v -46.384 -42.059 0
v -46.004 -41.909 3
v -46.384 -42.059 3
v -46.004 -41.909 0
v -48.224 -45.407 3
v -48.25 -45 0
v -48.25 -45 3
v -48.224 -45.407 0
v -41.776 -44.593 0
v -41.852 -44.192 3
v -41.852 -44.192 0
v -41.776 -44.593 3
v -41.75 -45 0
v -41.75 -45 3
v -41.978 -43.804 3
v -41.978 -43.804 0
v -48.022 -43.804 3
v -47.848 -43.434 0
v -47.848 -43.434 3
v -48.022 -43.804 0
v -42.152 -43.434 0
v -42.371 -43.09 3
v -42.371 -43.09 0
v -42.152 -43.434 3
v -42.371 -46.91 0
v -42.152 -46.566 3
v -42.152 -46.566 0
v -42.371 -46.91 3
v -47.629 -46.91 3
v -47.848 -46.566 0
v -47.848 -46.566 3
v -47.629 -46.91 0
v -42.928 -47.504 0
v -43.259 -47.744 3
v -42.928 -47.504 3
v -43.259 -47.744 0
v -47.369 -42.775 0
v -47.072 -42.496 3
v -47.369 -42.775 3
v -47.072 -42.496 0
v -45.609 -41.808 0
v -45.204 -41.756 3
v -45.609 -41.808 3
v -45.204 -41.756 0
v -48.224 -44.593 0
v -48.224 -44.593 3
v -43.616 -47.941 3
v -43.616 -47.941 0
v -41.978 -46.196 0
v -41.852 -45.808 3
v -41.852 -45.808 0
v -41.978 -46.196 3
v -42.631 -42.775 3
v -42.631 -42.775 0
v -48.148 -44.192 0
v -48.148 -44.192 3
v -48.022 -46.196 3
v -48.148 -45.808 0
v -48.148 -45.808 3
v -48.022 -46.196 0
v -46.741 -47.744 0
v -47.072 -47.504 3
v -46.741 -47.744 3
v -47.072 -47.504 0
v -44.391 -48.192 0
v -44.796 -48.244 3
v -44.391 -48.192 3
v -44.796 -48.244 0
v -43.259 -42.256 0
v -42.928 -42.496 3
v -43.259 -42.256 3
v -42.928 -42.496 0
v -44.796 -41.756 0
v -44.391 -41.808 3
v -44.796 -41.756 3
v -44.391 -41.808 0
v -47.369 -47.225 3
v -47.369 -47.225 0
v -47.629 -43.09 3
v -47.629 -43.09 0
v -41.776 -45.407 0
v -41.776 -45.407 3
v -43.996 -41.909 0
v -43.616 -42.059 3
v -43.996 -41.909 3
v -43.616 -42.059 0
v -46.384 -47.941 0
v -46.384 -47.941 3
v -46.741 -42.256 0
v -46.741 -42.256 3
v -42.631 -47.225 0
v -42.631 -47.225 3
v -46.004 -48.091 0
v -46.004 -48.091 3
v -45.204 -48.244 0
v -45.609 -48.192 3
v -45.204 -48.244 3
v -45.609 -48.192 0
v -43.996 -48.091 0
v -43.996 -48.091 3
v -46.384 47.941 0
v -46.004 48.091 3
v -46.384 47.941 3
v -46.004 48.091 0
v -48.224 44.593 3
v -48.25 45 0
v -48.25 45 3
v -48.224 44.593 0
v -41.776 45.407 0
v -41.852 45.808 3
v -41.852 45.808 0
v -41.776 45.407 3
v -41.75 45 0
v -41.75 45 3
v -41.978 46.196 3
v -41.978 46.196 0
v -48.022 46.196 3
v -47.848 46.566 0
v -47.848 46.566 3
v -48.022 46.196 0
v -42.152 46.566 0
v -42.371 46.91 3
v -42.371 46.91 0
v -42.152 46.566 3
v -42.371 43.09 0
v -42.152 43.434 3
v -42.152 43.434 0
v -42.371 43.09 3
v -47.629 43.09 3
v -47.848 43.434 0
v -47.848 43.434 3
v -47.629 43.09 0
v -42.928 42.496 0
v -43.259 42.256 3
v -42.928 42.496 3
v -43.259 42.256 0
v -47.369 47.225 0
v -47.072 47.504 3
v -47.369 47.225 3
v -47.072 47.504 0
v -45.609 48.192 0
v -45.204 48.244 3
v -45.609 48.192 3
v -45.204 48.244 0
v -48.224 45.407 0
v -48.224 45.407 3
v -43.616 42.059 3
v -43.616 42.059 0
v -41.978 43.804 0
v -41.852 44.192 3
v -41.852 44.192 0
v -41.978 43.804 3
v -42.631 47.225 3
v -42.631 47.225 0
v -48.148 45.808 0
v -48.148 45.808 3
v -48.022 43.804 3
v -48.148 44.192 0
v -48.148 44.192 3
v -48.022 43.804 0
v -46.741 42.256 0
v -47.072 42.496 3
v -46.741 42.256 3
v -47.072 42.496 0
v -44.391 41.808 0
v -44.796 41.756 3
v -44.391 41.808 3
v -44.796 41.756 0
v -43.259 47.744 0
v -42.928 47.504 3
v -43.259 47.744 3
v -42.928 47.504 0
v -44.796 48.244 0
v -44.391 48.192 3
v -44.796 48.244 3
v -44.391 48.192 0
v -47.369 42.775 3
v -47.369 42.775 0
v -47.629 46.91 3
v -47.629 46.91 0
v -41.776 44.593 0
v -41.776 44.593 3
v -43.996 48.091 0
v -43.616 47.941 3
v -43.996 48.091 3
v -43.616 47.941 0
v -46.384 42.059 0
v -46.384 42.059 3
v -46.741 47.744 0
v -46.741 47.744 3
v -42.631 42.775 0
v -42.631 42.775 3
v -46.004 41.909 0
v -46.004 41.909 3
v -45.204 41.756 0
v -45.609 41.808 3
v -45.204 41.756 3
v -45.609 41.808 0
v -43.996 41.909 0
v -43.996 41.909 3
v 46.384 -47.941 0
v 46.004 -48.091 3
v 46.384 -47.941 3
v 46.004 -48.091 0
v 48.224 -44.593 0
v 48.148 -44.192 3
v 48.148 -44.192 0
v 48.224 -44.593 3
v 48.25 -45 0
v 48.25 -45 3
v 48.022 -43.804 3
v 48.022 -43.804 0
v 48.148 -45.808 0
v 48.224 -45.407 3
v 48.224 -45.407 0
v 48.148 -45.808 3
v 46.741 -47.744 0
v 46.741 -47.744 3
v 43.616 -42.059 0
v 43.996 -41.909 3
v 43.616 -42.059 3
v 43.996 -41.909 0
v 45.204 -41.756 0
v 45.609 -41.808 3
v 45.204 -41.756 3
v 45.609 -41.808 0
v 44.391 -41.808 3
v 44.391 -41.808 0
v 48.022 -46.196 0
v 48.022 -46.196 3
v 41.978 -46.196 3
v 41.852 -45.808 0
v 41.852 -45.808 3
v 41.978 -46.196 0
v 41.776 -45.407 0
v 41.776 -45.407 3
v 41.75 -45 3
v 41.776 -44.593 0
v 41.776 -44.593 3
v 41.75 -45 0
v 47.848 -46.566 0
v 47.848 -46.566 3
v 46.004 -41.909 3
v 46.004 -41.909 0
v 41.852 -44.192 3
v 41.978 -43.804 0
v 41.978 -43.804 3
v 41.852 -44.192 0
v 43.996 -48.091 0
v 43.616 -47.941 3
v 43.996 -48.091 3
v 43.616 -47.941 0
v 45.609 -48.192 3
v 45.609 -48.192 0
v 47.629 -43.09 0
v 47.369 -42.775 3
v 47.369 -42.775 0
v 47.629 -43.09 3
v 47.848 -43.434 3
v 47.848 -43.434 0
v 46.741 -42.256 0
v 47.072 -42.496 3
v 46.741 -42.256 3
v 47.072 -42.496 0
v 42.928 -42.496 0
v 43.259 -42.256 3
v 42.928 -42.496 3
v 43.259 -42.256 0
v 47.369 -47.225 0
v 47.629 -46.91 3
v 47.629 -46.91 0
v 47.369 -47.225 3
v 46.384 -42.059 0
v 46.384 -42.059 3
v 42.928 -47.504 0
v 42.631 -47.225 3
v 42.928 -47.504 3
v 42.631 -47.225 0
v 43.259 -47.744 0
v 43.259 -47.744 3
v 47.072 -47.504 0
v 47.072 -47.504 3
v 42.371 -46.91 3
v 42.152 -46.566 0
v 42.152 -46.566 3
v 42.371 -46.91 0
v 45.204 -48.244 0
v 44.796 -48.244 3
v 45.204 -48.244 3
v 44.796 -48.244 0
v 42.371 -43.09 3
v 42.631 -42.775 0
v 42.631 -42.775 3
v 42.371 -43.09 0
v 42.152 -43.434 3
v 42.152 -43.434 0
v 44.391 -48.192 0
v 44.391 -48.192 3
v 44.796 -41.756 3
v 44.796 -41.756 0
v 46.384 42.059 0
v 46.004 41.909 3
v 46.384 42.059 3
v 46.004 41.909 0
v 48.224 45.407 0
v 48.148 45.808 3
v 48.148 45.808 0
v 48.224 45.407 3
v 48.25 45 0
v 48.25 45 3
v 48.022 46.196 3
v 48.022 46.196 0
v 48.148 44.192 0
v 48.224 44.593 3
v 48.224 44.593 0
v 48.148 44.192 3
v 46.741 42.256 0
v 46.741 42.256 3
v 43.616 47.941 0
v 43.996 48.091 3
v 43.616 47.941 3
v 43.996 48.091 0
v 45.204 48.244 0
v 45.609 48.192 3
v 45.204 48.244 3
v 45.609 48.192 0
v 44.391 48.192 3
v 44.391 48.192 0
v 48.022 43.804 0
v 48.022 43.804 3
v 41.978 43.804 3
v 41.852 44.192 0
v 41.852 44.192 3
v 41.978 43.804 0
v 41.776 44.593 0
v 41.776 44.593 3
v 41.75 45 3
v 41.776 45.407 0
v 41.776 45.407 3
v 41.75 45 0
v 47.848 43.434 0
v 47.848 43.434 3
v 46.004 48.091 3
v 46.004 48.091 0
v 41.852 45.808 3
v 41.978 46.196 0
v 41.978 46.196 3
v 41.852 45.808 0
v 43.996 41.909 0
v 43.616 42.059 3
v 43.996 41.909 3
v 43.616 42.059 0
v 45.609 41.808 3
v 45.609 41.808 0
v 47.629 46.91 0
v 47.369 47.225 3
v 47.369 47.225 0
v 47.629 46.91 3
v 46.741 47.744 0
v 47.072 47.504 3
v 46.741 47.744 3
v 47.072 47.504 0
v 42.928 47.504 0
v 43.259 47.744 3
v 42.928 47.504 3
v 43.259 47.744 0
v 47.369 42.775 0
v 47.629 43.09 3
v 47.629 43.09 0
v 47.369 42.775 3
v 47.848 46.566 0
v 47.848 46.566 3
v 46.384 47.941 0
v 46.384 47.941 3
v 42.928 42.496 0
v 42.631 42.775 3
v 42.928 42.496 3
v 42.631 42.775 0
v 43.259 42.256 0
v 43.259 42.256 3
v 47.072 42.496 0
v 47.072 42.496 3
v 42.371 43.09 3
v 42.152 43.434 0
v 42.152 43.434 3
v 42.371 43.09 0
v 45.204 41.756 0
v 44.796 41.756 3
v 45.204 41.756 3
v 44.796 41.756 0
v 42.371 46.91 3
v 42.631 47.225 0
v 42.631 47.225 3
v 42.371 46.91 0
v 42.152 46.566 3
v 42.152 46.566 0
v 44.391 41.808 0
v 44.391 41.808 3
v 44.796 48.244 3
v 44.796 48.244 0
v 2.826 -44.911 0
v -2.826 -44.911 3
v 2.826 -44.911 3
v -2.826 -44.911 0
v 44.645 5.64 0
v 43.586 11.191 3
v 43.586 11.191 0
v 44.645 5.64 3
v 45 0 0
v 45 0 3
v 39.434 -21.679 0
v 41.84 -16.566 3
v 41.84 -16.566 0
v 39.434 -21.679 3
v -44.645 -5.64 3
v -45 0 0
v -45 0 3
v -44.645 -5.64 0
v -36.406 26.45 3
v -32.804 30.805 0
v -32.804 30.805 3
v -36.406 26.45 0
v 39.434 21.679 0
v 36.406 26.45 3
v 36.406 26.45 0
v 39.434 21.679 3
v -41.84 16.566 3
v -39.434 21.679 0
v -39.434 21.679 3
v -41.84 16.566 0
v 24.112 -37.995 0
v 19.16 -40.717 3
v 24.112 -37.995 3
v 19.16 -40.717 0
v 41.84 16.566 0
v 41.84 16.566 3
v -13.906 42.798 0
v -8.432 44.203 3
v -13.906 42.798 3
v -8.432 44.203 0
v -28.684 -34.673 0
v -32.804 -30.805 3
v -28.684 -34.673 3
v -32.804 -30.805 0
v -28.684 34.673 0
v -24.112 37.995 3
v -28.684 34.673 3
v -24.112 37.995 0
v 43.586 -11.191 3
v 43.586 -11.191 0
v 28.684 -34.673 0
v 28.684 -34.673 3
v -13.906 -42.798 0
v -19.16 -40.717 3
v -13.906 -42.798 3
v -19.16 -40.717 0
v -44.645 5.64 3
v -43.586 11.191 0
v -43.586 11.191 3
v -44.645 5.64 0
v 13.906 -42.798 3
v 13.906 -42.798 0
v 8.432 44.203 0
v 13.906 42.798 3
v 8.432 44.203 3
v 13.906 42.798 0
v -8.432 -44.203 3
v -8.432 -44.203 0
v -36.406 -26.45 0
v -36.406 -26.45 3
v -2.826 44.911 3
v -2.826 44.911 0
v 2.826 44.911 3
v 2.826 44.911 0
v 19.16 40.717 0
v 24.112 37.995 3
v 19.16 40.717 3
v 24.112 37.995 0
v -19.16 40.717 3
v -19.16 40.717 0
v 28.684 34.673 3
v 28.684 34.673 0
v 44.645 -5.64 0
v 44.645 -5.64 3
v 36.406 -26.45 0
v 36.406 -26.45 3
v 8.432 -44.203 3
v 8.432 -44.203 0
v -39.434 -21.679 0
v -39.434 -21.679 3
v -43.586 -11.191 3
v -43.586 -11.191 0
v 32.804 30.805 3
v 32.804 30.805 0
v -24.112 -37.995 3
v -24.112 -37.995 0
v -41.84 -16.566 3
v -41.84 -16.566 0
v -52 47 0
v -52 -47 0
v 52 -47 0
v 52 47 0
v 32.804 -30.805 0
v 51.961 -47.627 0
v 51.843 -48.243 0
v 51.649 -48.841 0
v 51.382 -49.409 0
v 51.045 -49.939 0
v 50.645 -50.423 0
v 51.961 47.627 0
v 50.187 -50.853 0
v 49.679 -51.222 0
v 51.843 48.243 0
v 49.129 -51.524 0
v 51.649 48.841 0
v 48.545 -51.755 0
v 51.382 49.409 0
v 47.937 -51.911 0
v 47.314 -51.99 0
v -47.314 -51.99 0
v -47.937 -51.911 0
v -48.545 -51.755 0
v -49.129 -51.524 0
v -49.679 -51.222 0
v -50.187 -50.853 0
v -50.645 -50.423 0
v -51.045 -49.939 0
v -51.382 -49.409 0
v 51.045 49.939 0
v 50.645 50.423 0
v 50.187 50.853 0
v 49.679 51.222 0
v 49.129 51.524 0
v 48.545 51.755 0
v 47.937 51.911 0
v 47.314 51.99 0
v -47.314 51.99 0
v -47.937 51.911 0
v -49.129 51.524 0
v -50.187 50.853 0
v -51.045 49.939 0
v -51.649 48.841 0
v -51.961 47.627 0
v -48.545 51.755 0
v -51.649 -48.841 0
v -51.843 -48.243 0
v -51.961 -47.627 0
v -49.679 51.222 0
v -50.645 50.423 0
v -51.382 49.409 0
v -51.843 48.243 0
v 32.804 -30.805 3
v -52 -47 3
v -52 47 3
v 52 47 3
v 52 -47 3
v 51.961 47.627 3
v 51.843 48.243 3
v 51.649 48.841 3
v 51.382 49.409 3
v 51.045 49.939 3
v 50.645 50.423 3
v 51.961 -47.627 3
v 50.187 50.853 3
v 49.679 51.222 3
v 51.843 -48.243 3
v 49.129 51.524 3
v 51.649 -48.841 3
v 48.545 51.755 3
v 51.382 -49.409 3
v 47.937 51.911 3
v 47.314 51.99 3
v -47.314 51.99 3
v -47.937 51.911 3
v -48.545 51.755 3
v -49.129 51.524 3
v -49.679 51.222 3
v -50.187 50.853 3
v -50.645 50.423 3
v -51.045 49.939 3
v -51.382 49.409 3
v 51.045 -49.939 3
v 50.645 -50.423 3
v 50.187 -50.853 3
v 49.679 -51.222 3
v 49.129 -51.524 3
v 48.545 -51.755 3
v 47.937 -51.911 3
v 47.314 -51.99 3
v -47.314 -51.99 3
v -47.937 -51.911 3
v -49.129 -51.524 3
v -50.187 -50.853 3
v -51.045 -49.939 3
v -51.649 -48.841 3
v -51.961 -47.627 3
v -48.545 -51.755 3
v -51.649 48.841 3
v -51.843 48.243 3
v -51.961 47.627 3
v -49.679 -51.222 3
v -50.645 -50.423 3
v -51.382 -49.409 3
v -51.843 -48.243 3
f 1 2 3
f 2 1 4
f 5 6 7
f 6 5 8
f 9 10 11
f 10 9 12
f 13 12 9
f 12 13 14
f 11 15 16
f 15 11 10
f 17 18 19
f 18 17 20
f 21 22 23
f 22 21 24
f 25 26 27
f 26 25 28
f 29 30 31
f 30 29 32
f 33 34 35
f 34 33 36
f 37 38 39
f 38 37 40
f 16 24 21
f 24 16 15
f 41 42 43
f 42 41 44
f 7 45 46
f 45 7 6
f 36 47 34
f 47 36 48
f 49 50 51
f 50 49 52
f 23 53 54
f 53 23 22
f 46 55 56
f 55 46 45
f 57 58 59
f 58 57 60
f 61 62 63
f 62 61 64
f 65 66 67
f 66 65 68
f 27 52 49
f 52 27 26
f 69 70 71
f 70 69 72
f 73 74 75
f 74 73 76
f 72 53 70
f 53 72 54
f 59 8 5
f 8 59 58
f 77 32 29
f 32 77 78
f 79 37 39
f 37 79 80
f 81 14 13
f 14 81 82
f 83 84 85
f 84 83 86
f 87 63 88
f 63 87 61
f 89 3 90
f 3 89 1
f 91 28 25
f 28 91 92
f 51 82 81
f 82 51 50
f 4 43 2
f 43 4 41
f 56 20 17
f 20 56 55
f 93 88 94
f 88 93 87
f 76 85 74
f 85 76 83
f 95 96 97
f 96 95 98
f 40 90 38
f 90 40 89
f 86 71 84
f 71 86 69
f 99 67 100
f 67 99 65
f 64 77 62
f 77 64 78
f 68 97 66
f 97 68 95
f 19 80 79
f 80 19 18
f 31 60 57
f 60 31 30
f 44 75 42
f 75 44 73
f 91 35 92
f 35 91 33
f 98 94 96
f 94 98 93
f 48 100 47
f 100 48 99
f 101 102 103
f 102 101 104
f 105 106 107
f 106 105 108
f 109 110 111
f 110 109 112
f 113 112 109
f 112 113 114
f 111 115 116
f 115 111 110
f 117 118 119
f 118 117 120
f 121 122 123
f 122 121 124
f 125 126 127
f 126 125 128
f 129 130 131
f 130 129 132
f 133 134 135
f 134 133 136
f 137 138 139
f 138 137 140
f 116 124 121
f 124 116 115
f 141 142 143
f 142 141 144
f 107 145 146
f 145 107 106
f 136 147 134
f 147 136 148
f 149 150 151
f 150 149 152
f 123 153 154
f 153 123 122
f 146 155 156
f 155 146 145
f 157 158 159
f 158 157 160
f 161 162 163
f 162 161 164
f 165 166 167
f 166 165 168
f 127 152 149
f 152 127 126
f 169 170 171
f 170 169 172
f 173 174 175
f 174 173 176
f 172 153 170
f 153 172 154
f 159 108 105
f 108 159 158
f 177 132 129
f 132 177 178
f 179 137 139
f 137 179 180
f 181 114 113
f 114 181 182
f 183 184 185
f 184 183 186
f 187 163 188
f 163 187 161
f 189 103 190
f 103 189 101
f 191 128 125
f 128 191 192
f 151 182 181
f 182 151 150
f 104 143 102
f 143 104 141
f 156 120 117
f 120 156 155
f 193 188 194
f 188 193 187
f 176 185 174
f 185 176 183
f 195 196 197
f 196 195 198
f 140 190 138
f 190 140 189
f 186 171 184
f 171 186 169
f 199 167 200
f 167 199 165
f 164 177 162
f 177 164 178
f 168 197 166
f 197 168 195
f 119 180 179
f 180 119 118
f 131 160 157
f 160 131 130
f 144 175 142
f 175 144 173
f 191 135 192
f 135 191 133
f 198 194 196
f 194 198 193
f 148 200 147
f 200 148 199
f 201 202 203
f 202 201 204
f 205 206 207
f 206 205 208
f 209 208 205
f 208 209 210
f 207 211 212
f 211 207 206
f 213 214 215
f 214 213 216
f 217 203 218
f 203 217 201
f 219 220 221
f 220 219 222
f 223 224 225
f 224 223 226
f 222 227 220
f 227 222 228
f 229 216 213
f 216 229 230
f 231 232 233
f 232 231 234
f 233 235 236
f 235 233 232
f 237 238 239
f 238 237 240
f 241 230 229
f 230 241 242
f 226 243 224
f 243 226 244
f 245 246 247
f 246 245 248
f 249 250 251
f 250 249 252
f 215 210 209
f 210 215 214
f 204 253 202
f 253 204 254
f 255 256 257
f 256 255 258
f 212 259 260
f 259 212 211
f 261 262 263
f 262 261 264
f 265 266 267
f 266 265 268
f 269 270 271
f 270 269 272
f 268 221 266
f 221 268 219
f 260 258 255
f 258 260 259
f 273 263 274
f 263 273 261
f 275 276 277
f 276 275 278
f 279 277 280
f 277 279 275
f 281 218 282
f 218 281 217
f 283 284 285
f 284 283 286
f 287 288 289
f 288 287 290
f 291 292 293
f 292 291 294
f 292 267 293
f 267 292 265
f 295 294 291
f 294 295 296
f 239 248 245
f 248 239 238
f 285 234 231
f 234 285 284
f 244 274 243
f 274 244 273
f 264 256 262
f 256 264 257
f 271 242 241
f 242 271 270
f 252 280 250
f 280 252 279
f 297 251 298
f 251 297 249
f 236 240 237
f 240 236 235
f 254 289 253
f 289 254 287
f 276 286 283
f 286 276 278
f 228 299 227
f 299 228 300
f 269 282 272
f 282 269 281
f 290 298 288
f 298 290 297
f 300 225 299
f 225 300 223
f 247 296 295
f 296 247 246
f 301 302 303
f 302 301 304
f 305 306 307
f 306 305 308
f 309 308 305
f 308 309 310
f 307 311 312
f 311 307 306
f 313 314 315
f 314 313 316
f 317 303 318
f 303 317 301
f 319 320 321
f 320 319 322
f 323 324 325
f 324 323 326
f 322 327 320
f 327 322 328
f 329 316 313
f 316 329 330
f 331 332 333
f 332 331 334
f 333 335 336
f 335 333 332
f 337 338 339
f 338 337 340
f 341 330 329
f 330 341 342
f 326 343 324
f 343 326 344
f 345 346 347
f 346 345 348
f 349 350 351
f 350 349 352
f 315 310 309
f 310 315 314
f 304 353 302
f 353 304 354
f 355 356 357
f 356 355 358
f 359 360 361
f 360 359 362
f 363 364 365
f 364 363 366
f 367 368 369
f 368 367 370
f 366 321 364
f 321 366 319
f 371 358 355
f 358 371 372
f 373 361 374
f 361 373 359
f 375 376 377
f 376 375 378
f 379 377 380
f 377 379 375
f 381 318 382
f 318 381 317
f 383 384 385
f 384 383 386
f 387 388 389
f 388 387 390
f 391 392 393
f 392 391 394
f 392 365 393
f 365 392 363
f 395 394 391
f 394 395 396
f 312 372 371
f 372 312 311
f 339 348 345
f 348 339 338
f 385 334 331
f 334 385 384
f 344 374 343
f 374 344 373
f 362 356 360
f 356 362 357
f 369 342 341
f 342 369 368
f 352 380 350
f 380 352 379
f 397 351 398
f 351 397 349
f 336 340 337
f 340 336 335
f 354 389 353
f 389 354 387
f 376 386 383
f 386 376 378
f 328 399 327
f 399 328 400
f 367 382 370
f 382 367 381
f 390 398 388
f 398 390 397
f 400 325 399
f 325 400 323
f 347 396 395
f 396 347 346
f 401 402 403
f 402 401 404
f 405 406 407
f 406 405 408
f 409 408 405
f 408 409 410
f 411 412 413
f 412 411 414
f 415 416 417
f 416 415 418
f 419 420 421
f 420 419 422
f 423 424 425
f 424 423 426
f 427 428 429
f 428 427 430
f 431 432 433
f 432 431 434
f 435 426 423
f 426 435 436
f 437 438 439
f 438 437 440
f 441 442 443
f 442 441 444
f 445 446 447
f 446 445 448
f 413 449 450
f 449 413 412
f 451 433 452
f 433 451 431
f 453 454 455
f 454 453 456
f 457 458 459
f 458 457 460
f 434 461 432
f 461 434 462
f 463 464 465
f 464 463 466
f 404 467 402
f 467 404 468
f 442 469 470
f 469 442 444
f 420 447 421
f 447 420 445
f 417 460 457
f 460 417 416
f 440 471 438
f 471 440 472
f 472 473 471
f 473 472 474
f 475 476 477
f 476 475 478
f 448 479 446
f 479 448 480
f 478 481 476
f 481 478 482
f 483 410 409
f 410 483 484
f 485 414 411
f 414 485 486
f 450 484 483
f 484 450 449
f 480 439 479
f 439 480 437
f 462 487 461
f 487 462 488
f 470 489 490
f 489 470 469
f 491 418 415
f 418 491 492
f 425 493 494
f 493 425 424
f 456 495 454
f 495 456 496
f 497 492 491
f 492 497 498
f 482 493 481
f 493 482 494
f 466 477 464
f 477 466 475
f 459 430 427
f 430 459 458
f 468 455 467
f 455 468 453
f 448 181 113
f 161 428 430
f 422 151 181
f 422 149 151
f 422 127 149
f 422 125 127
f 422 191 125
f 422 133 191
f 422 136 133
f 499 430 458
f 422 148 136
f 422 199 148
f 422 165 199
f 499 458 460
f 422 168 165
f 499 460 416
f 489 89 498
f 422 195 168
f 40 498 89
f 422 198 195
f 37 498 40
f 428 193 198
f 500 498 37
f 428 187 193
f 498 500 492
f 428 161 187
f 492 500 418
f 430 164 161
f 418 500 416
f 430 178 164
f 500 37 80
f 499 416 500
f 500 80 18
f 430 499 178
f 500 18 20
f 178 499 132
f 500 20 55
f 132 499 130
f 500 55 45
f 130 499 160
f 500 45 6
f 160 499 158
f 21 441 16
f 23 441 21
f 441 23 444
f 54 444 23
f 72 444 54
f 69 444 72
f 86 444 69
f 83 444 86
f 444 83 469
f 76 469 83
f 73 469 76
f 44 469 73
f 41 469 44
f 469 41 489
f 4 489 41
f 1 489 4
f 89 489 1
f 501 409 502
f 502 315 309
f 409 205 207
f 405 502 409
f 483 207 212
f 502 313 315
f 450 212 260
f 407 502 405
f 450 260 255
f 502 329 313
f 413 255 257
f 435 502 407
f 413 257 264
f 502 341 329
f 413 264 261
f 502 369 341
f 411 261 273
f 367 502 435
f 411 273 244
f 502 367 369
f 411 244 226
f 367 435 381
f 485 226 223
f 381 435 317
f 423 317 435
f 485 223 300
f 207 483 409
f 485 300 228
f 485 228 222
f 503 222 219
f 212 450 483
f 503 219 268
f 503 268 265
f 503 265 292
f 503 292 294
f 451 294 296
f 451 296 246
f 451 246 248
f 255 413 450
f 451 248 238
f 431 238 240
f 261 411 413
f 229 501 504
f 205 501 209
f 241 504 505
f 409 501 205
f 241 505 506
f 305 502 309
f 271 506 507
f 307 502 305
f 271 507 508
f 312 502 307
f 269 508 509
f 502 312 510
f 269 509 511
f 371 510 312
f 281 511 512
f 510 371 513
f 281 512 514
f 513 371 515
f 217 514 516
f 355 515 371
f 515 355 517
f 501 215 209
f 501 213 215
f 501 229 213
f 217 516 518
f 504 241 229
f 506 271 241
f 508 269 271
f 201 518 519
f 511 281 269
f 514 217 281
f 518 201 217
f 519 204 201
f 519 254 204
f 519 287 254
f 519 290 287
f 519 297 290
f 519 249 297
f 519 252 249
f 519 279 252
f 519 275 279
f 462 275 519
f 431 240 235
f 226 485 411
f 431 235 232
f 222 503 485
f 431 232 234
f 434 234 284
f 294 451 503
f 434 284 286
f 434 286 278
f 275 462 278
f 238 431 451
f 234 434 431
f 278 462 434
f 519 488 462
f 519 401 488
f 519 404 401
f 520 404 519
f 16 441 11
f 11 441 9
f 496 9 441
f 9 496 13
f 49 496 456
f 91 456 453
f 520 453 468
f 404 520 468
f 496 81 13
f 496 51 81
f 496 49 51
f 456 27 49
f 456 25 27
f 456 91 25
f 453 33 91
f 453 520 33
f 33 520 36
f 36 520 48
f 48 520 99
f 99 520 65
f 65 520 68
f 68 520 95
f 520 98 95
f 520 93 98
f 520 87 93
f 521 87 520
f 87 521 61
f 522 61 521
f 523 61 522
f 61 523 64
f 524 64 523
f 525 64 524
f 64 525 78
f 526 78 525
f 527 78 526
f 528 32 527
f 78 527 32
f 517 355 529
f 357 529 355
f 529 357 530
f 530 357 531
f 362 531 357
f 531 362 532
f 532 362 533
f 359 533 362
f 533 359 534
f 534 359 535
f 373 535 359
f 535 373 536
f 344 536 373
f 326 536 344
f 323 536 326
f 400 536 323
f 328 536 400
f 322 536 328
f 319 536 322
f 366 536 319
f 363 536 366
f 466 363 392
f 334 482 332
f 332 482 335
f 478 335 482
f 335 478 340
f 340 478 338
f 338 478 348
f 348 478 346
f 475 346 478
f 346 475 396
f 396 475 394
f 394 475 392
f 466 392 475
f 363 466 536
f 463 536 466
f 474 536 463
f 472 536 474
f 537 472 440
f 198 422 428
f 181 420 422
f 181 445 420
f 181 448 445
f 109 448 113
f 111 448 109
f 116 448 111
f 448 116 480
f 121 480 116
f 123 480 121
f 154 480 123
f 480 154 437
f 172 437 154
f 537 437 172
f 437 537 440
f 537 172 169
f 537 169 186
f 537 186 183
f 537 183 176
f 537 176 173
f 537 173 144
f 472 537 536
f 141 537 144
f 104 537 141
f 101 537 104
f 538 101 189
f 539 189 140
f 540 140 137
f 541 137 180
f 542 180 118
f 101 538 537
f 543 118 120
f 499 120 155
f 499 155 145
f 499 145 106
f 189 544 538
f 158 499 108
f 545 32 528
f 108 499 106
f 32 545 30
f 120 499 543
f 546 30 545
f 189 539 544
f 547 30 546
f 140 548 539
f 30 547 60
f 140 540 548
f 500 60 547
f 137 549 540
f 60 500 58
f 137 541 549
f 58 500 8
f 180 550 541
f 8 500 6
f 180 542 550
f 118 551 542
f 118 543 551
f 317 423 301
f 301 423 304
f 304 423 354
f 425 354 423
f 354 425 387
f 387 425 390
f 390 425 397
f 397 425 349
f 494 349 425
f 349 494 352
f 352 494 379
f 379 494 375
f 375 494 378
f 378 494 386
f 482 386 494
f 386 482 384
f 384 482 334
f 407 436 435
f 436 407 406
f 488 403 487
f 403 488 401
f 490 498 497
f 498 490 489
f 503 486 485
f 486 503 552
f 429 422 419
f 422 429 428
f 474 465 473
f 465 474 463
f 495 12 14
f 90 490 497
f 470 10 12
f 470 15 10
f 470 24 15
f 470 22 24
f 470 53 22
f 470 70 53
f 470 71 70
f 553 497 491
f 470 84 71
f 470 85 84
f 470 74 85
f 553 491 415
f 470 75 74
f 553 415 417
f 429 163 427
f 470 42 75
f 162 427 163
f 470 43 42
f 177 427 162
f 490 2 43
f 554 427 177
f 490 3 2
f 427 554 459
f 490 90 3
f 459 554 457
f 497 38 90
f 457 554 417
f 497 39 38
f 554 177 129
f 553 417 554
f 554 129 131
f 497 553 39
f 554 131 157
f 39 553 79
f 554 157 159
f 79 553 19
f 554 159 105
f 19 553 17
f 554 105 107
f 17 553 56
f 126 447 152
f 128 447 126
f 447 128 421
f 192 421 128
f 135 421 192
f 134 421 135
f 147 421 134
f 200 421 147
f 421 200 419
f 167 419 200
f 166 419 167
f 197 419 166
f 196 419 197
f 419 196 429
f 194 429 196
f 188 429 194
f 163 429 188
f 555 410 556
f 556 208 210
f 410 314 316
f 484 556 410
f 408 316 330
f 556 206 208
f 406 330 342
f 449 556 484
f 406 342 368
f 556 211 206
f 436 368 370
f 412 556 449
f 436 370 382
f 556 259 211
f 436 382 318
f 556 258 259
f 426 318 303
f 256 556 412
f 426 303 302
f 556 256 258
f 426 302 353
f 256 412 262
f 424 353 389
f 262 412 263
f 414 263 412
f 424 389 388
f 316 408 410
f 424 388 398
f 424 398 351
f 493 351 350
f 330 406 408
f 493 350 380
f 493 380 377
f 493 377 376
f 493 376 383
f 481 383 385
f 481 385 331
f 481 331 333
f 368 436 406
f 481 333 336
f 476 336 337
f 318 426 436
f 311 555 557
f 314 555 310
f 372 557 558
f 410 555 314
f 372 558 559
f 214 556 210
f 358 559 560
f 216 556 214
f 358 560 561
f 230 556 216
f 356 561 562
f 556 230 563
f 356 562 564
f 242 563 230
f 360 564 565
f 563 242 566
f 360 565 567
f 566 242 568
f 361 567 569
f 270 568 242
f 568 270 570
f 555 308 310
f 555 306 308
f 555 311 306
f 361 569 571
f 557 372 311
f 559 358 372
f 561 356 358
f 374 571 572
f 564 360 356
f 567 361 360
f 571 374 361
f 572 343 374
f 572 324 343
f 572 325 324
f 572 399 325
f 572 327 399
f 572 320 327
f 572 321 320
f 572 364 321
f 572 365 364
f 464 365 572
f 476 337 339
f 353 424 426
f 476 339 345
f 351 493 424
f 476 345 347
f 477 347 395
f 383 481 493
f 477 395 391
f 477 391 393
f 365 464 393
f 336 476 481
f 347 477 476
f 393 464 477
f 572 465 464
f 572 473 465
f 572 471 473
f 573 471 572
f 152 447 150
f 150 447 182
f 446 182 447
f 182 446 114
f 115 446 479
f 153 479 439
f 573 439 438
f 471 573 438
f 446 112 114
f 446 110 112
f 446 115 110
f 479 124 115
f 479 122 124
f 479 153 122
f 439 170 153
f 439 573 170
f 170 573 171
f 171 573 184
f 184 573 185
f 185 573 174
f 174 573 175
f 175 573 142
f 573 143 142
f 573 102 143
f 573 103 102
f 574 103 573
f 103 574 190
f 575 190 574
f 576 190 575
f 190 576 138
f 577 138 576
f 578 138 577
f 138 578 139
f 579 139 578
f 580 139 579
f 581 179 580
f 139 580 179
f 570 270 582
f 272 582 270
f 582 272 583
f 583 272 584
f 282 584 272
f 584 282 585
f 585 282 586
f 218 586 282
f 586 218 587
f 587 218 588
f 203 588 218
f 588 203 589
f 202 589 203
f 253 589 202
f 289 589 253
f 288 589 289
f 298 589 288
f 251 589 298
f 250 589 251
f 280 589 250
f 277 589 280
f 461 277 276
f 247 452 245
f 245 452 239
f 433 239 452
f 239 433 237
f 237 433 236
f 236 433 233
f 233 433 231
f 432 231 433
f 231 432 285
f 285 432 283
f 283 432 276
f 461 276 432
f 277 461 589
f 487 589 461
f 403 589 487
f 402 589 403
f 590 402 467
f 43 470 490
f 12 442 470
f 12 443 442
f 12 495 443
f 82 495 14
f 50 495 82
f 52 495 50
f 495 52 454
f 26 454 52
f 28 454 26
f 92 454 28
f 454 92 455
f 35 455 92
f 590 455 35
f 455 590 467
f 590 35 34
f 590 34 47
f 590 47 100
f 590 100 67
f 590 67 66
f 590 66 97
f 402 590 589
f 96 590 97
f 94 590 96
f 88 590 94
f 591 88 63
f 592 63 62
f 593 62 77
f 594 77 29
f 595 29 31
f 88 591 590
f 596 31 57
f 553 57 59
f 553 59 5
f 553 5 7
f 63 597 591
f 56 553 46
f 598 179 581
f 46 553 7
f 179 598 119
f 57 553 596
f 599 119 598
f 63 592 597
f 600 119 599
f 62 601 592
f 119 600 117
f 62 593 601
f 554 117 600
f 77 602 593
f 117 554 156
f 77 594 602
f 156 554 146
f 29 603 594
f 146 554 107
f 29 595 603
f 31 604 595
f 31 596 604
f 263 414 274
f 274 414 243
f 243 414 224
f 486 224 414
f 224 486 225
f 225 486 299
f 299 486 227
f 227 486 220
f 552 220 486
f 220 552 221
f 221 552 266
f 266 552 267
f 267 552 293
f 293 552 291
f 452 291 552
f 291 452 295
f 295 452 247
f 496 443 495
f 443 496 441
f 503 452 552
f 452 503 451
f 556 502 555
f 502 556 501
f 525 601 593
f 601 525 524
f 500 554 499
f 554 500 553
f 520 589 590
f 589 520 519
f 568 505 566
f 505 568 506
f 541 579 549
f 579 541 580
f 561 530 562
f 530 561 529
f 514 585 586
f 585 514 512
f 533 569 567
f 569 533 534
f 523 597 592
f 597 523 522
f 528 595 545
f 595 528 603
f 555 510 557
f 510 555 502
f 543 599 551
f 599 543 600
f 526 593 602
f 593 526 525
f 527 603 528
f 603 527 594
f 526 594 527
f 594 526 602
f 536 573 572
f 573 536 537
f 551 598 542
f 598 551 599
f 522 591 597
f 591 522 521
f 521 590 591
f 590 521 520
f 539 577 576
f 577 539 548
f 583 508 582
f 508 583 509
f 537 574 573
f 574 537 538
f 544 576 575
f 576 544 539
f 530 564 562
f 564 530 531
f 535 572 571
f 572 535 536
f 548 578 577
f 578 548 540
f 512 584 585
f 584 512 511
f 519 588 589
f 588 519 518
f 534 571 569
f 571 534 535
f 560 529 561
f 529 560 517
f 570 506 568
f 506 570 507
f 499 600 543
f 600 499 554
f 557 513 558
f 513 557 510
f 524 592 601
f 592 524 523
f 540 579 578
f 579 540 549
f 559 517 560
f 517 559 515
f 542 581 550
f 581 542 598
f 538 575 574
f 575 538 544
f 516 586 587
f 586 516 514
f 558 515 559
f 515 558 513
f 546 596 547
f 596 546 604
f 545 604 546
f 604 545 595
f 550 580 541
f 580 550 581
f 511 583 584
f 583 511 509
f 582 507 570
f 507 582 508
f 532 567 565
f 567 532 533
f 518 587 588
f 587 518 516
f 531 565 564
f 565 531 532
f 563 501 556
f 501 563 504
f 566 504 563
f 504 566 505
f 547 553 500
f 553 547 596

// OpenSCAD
$fn = 50;

difference() {
	union() {
		hull() {
			translate(v = [-47.0, 47.0, 0]) {
				cylinder(h = 3, r = 5);
			}
			translate(v = [47.0, 47.0, 0]) {
				cylinder(h = 3, r = 5);
			}
			translate(v = [-47.0, -47.0, 0]) {
				cylinder(h = 3, r = 5);
			}
			translate(v = [47.0, -47.0, 0]) {
				cylinder(h = 3, r = 5);
			}
		}
	}
	union() {
		translate(v = [-45.0, -45.0, -100.0]) {
			cylinder(h = 200, r = 3.25);
		}
		translate(v = [-45.0, 45.0, -100.0]) {
			cylinder(h = 200, r = 3.25);
		}
		translate(v = [45.0, -45.0, -100.0]) {
			cylinder(h = 200, r = 3.25);
		}
		translate(v = [45.0, 45.0, -100.0]) {
			cylinder(h = 200, r = 3.25);
		}
		translate(v = [-45.0, -45.0, -100.0]) {
			cylinder(h = 200, r = 1.8);
		}
		translate(v = [-45.0, 45.0, -100.0]) {
			cylinder(h = 200, r = 1.8);
		}
		translate(v = [45.0, -45.0, -100.0]) {
			cylinder(h = 200, r = 1.8);
		}
		translate(v = [45.0, 45.0, -100.0]) {
			cylinder(h = 200, r = 1.8);
		}
		cylinder(h = 3, r = 45.0);
	}
}
